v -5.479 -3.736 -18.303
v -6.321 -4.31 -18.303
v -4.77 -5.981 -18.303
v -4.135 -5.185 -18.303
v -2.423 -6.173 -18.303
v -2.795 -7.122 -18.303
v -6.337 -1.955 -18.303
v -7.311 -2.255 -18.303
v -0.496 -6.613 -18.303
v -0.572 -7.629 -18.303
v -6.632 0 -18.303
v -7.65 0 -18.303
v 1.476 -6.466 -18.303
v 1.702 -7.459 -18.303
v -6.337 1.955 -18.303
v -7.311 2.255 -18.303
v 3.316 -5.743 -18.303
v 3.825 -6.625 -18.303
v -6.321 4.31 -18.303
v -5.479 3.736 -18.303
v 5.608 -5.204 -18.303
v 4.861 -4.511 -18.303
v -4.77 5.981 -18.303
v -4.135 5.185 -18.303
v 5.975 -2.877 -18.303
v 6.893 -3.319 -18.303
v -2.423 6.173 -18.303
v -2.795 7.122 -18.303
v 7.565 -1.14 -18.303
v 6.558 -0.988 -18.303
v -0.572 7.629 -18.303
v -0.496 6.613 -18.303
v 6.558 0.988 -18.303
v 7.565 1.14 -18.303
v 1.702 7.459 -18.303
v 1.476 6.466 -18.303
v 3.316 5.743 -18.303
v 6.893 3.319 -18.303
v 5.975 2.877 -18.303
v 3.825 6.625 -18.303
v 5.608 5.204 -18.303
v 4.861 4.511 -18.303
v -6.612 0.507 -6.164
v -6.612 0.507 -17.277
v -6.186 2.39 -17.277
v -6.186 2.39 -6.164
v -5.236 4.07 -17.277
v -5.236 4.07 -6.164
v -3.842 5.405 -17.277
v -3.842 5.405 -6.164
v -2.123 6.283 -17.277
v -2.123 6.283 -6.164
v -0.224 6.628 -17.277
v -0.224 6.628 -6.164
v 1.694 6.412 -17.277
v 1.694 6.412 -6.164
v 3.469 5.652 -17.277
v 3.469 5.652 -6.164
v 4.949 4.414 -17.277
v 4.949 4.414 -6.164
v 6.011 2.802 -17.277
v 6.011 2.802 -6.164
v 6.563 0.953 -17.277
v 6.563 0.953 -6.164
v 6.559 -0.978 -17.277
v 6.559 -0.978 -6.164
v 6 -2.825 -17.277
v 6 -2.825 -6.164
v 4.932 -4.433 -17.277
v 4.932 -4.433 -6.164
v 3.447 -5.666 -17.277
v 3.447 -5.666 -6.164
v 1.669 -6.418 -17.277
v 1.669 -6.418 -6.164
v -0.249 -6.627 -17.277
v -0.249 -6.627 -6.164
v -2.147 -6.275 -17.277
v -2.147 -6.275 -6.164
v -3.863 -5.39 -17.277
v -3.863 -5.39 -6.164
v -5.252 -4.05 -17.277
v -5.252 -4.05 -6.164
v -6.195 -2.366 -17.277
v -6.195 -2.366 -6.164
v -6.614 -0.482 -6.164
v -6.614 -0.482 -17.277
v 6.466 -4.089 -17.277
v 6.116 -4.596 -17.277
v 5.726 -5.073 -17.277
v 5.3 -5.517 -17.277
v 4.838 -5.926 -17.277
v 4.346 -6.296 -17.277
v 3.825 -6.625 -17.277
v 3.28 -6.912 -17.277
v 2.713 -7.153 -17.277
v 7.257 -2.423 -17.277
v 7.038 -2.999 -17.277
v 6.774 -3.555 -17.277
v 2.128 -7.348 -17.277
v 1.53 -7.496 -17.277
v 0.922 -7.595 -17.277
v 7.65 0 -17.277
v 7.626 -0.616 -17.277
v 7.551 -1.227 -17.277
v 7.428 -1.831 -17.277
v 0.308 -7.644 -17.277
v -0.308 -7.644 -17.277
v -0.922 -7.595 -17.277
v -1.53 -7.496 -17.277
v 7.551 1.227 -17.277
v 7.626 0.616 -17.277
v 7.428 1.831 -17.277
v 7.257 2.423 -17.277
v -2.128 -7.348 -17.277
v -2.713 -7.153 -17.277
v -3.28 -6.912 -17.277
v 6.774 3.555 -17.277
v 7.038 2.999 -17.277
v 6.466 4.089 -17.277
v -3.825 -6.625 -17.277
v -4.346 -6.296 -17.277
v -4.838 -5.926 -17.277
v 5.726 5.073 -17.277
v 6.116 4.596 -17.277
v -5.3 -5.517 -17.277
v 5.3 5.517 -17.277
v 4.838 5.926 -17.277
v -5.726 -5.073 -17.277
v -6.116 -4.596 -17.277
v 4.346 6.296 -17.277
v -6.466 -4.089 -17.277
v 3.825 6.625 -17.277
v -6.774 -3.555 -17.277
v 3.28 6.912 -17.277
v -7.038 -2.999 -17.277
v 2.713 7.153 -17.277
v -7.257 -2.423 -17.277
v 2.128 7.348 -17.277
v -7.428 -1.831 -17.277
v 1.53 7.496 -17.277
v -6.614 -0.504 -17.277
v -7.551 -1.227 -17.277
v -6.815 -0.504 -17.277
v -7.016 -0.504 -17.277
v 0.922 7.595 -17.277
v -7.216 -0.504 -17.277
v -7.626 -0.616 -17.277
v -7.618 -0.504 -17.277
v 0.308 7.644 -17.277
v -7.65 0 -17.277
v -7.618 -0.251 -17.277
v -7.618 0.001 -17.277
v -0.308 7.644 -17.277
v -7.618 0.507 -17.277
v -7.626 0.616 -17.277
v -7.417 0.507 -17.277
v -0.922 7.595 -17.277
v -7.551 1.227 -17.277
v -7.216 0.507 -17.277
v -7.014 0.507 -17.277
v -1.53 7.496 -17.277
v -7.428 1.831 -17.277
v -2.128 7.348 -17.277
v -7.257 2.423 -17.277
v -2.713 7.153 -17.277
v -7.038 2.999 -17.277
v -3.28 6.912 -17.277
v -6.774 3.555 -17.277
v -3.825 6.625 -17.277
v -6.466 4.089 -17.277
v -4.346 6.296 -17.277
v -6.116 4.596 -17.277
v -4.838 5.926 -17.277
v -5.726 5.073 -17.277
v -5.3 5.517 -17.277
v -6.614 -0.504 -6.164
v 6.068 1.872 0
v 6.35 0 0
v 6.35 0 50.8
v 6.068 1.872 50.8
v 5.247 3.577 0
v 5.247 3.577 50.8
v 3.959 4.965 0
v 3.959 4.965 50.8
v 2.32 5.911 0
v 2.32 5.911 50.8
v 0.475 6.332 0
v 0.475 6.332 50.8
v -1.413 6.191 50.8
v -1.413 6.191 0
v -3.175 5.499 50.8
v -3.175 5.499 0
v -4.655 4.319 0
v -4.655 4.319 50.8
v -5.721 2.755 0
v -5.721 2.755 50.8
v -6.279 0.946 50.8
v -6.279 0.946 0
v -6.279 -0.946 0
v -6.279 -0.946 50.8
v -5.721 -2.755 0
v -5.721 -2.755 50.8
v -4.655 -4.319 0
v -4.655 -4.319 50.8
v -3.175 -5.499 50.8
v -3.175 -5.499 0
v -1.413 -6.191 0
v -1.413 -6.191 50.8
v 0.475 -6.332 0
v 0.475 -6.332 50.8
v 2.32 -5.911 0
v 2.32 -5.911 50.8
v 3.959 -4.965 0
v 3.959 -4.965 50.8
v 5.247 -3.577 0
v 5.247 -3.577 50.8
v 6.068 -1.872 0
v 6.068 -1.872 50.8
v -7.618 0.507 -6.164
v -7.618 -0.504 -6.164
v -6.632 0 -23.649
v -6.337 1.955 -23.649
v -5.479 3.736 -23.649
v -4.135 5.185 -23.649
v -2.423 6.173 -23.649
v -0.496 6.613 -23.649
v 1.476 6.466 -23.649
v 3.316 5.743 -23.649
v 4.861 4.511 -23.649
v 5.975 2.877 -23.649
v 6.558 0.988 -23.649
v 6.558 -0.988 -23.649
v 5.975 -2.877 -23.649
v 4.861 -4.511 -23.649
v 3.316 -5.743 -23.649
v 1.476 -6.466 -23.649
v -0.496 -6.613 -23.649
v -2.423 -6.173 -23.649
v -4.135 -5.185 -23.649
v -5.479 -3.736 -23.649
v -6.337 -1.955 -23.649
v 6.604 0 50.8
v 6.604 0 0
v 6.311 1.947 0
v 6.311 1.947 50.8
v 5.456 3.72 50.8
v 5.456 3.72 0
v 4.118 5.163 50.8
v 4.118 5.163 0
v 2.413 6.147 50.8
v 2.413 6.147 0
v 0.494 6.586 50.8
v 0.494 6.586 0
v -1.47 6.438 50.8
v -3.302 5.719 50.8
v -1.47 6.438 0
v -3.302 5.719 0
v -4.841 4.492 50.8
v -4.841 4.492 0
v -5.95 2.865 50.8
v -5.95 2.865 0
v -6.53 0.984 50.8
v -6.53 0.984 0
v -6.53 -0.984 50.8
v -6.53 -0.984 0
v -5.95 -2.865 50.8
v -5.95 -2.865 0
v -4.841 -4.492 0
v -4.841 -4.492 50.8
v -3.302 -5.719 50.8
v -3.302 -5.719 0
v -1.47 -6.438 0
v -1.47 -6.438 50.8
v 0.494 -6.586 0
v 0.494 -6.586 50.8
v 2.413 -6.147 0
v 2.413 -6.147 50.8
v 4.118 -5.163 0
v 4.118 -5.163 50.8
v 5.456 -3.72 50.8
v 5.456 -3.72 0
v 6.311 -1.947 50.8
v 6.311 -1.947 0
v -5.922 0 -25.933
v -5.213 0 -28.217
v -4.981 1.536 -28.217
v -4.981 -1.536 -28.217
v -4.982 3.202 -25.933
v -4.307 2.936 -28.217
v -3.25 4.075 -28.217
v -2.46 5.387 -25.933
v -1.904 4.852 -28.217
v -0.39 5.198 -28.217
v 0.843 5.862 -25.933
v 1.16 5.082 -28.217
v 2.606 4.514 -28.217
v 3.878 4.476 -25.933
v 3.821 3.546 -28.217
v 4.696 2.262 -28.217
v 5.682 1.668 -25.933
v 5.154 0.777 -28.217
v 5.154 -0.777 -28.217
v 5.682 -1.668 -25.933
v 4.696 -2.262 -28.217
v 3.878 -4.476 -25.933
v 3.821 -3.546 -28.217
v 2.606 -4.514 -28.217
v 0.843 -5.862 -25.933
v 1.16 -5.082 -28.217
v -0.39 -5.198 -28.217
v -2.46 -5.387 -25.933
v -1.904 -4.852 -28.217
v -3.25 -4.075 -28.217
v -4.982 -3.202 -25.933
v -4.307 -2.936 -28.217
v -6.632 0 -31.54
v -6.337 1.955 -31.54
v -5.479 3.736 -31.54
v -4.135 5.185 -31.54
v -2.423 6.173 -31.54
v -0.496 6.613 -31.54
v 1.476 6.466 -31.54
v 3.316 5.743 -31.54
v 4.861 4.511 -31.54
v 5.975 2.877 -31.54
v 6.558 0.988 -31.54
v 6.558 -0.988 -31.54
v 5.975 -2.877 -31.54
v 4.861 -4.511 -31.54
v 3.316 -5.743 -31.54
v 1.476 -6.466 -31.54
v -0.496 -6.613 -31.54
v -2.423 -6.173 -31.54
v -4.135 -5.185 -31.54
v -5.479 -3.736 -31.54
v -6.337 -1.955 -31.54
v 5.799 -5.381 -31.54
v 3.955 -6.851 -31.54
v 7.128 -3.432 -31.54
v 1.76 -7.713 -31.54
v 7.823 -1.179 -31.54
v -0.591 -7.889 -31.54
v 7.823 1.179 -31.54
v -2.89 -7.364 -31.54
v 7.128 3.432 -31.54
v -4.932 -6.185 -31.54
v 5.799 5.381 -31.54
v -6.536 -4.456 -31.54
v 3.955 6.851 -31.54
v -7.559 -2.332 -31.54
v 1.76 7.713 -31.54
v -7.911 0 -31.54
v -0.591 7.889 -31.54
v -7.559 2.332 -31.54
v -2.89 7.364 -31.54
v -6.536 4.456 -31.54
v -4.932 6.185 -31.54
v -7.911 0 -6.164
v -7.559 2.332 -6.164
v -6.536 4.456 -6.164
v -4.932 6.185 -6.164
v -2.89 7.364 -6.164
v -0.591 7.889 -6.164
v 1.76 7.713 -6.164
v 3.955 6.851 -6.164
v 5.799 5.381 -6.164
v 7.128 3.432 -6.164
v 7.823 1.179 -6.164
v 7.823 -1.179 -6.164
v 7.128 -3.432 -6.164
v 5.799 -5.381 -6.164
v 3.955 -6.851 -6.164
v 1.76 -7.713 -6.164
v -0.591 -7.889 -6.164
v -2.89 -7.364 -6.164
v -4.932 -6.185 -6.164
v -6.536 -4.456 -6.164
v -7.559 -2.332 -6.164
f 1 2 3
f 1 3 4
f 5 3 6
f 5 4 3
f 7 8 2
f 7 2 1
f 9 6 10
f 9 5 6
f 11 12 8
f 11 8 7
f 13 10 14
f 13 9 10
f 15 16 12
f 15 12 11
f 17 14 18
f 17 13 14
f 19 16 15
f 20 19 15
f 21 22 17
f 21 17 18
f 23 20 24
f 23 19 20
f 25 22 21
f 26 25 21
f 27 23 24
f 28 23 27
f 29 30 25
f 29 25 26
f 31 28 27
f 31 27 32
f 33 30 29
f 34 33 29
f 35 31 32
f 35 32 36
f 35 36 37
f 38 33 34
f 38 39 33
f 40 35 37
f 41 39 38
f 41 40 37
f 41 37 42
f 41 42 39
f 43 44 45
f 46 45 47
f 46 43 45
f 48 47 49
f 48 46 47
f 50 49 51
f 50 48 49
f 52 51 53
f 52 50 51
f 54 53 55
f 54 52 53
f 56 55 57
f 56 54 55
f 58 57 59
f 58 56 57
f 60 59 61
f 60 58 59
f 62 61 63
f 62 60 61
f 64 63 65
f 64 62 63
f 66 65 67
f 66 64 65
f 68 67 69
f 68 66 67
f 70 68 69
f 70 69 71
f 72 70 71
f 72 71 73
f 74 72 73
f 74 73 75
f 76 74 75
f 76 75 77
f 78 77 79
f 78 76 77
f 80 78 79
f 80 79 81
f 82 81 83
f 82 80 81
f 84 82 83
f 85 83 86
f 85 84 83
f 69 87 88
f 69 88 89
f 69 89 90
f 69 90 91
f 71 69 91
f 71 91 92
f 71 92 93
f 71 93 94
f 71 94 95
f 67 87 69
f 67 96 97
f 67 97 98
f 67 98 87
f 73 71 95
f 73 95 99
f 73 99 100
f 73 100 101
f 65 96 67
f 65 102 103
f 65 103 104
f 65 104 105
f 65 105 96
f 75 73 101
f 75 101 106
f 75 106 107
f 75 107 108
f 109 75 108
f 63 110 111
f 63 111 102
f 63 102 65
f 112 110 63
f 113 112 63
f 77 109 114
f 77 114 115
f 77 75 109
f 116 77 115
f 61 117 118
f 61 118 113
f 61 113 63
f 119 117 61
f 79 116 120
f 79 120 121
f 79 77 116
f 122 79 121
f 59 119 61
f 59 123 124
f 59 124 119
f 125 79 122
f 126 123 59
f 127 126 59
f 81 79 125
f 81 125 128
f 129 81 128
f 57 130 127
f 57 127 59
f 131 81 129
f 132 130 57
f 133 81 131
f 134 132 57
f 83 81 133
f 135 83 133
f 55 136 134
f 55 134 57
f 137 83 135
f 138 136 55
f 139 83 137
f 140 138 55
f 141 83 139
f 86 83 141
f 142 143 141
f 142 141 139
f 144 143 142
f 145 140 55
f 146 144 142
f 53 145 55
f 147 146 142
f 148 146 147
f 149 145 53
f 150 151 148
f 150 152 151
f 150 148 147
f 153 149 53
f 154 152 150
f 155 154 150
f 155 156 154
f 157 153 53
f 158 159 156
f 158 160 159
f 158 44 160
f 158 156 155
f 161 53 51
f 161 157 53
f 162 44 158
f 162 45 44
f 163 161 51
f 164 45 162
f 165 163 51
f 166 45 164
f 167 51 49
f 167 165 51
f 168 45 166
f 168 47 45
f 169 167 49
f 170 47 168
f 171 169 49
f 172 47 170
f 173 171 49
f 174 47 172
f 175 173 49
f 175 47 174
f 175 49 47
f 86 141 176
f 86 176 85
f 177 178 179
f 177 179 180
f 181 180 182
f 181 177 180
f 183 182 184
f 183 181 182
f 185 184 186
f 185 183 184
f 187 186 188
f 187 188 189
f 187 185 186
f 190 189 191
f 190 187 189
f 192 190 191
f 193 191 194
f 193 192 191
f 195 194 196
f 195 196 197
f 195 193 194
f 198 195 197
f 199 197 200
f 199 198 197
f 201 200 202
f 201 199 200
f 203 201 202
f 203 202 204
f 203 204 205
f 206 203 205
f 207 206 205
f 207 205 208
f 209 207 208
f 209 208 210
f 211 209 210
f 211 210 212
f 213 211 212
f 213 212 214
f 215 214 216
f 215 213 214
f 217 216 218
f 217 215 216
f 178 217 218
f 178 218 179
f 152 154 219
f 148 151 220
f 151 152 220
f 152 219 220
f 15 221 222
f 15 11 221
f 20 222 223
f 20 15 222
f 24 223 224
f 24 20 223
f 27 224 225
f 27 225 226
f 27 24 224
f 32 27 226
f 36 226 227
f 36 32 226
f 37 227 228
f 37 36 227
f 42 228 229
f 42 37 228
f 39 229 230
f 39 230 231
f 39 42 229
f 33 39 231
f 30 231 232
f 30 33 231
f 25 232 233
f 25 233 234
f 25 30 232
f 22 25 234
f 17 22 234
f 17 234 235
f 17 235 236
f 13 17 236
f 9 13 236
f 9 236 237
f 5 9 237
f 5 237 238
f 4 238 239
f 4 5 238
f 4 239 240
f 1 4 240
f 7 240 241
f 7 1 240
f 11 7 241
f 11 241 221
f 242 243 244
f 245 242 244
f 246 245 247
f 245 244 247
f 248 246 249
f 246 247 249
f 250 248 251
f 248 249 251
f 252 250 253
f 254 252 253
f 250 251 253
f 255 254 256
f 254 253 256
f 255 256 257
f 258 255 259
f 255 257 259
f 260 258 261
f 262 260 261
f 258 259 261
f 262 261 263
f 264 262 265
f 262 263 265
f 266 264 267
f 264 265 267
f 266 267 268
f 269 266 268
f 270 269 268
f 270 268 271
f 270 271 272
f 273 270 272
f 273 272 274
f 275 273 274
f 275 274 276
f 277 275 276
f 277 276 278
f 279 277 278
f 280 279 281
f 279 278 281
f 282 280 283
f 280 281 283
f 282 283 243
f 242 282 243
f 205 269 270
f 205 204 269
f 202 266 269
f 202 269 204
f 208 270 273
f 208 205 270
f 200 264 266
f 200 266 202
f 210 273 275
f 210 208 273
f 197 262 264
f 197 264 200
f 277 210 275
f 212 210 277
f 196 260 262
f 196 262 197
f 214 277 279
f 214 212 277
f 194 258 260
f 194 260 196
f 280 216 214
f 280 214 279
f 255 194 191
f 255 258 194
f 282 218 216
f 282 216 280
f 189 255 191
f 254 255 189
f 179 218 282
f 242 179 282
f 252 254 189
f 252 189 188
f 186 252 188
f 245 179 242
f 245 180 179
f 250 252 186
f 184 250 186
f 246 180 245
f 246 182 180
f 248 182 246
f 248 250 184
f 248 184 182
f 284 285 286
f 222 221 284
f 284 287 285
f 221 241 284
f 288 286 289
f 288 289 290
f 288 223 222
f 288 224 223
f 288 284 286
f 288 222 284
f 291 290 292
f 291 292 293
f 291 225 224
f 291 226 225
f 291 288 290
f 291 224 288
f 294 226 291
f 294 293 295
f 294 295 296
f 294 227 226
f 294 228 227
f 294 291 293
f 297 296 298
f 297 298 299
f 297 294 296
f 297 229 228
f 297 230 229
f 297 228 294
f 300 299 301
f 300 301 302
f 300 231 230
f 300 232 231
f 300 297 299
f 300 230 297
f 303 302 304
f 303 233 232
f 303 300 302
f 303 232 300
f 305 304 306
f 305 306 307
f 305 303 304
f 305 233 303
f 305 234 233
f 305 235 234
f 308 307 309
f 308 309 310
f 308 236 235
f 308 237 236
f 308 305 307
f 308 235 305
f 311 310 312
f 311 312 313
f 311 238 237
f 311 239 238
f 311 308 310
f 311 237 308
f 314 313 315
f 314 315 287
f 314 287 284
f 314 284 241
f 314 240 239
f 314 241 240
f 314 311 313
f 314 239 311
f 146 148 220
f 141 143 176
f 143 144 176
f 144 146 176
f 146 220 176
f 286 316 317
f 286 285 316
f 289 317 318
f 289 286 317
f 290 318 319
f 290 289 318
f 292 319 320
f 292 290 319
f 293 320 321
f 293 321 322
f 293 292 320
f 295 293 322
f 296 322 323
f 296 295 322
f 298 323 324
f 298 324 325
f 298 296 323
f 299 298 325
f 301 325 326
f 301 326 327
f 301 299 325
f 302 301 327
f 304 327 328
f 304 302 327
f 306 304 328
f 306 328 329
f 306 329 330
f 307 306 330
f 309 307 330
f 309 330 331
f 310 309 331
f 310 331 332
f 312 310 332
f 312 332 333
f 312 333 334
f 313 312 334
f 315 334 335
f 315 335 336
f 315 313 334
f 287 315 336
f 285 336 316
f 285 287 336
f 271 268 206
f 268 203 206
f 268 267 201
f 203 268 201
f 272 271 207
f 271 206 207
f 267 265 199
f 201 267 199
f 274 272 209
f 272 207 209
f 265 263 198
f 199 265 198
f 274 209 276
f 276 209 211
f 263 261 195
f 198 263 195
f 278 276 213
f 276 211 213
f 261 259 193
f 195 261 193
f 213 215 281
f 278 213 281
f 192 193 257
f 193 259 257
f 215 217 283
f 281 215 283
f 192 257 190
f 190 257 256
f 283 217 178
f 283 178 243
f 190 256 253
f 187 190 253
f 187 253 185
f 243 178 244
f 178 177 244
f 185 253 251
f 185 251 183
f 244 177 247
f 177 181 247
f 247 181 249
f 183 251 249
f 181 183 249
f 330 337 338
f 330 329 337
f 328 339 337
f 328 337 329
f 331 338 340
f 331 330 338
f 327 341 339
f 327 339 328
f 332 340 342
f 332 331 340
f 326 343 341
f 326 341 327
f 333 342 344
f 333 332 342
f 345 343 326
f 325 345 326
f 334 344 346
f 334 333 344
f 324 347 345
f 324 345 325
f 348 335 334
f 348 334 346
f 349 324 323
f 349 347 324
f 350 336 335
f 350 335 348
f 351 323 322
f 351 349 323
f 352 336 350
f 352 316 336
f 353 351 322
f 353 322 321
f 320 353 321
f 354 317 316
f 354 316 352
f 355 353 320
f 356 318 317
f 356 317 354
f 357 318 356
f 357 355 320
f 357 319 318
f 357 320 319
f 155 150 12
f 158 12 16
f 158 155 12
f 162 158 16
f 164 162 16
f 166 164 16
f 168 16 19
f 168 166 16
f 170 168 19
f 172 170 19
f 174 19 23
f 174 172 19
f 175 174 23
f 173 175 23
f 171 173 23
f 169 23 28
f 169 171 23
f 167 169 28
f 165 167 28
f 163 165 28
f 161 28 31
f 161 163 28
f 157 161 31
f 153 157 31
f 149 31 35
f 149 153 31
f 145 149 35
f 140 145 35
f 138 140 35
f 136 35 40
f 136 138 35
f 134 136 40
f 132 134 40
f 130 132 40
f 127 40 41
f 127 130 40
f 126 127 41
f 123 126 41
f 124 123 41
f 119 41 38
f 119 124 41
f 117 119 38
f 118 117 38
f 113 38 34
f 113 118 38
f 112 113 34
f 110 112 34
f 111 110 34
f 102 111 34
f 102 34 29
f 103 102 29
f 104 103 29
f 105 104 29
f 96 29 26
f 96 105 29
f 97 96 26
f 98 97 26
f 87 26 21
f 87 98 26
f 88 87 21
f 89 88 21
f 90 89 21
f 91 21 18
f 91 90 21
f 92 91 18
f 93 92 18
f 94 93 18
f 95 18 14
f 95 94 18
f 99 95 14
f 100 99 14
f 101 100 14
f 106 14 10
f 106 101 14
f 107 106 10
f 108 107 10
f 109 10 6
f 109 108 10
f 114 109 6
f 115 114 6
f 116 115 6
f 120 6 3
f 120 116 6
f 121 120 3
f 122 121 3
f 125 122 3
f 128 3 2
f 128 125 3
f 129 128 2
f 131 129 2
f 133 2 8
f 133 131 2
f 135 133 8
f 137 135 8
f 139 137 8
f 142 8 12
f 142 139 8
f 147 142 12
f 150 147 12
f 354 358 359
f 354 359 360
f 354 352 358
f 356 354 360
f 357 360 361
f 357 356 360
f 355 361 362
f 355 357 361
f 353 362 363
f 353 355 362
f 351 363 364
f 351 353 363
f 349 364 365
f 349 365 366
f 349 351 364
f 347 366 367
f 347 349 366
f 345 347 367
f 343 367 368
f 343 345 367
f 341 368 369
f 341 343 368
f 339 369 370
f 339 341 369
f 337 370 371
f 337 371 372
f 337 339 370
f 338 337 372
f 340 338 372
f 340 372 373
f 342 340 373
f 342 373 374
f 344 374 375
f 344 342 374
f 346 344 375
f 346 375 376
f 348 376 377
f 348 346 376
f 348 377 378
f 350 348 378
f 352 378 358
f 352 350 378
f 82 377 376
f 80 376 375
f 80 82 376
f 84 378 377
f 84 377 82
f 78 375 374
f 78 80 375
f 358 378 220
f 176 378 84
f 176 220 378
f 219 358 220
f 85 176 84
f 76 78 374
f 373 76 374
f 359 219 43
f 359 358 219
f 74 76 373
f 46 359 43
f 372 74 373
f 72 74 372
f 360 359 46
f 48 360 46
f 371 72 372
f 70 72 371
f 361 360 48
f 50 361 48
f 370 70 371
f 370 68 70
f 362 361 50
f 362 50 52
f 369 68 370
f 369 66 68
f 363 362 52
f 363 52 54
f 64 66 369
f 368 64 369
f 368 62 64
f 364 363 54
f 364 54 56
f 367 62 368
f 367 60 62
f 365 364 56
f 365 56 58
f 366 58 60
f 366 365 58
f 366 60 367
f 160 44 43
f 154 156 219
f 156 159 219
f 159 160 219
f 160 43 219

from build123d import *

# Parameters (mm, degrees)
F2_R      = 6.604
F2_R_2    = 6.35
F6_DEPTH  = 50.8
F10_DEPTH = 12.1158


with BuildPart() as f5:
    # F4 (on Front) → F5 (revolve)
    with BuildSketch(Plane.XZ):
        Polygon((-6.6317934543, -17.2770749778), (-6.6317934543, -6.1637992039), (-7.9109435901, -6.1637992039), (-7.9109435901, -31.539734453), (-6.6317934543, -31.539734453), (-5.2126999944, -28.2172597945), (-6.6317934543, -23.6488562077), (-6.6317934543, -18.3032099158), (-7.6504037715, -18.3032099158), (-7.6504037715, -17.2770749778), align=None)
    revolve(axis=Axis((0, 0, 4.9336738884), (0, 0, -1)))

    # F9 (on face) → F10 (cut)
    with BuildSketch(Plane.XY.offset(-6.1637992039)):
        with BuildLine():
            ThreePointArc((-6.6142721045, -0.4817561087), (-6.6317812883, 0.0127029421), (-6.6123780023, 0.5070912885))
            Line((-6.6123780023, 0.5070912885), (-7.6176812872, 0.5070912885))
            Line((-7.6176812872, 0.5070912885), (-7.6176812872, -0.5042540142))
            Line((-7.6176812872, -0.5042540142), (-6.6143763252, -0.5042540142))
            Line((-6.6143763252, -0.5042540142), (-6.6142721045, -0.4817561087))
        make_face()
    extrude(amount=-F10_DEPTH, mode=Mode.SUBTRACT)


with BuildPart() as f6:
    # F2 (on face) → F6 (new body)
    with BuildSketch(Plane.XY):
        Circle(F2_R)
        Circle(F2_R_2, mode=Mode.SUBTRACT)
    extrude(amount=F6_DEPTH)


solid = Compound([f5.part, f6.part])
